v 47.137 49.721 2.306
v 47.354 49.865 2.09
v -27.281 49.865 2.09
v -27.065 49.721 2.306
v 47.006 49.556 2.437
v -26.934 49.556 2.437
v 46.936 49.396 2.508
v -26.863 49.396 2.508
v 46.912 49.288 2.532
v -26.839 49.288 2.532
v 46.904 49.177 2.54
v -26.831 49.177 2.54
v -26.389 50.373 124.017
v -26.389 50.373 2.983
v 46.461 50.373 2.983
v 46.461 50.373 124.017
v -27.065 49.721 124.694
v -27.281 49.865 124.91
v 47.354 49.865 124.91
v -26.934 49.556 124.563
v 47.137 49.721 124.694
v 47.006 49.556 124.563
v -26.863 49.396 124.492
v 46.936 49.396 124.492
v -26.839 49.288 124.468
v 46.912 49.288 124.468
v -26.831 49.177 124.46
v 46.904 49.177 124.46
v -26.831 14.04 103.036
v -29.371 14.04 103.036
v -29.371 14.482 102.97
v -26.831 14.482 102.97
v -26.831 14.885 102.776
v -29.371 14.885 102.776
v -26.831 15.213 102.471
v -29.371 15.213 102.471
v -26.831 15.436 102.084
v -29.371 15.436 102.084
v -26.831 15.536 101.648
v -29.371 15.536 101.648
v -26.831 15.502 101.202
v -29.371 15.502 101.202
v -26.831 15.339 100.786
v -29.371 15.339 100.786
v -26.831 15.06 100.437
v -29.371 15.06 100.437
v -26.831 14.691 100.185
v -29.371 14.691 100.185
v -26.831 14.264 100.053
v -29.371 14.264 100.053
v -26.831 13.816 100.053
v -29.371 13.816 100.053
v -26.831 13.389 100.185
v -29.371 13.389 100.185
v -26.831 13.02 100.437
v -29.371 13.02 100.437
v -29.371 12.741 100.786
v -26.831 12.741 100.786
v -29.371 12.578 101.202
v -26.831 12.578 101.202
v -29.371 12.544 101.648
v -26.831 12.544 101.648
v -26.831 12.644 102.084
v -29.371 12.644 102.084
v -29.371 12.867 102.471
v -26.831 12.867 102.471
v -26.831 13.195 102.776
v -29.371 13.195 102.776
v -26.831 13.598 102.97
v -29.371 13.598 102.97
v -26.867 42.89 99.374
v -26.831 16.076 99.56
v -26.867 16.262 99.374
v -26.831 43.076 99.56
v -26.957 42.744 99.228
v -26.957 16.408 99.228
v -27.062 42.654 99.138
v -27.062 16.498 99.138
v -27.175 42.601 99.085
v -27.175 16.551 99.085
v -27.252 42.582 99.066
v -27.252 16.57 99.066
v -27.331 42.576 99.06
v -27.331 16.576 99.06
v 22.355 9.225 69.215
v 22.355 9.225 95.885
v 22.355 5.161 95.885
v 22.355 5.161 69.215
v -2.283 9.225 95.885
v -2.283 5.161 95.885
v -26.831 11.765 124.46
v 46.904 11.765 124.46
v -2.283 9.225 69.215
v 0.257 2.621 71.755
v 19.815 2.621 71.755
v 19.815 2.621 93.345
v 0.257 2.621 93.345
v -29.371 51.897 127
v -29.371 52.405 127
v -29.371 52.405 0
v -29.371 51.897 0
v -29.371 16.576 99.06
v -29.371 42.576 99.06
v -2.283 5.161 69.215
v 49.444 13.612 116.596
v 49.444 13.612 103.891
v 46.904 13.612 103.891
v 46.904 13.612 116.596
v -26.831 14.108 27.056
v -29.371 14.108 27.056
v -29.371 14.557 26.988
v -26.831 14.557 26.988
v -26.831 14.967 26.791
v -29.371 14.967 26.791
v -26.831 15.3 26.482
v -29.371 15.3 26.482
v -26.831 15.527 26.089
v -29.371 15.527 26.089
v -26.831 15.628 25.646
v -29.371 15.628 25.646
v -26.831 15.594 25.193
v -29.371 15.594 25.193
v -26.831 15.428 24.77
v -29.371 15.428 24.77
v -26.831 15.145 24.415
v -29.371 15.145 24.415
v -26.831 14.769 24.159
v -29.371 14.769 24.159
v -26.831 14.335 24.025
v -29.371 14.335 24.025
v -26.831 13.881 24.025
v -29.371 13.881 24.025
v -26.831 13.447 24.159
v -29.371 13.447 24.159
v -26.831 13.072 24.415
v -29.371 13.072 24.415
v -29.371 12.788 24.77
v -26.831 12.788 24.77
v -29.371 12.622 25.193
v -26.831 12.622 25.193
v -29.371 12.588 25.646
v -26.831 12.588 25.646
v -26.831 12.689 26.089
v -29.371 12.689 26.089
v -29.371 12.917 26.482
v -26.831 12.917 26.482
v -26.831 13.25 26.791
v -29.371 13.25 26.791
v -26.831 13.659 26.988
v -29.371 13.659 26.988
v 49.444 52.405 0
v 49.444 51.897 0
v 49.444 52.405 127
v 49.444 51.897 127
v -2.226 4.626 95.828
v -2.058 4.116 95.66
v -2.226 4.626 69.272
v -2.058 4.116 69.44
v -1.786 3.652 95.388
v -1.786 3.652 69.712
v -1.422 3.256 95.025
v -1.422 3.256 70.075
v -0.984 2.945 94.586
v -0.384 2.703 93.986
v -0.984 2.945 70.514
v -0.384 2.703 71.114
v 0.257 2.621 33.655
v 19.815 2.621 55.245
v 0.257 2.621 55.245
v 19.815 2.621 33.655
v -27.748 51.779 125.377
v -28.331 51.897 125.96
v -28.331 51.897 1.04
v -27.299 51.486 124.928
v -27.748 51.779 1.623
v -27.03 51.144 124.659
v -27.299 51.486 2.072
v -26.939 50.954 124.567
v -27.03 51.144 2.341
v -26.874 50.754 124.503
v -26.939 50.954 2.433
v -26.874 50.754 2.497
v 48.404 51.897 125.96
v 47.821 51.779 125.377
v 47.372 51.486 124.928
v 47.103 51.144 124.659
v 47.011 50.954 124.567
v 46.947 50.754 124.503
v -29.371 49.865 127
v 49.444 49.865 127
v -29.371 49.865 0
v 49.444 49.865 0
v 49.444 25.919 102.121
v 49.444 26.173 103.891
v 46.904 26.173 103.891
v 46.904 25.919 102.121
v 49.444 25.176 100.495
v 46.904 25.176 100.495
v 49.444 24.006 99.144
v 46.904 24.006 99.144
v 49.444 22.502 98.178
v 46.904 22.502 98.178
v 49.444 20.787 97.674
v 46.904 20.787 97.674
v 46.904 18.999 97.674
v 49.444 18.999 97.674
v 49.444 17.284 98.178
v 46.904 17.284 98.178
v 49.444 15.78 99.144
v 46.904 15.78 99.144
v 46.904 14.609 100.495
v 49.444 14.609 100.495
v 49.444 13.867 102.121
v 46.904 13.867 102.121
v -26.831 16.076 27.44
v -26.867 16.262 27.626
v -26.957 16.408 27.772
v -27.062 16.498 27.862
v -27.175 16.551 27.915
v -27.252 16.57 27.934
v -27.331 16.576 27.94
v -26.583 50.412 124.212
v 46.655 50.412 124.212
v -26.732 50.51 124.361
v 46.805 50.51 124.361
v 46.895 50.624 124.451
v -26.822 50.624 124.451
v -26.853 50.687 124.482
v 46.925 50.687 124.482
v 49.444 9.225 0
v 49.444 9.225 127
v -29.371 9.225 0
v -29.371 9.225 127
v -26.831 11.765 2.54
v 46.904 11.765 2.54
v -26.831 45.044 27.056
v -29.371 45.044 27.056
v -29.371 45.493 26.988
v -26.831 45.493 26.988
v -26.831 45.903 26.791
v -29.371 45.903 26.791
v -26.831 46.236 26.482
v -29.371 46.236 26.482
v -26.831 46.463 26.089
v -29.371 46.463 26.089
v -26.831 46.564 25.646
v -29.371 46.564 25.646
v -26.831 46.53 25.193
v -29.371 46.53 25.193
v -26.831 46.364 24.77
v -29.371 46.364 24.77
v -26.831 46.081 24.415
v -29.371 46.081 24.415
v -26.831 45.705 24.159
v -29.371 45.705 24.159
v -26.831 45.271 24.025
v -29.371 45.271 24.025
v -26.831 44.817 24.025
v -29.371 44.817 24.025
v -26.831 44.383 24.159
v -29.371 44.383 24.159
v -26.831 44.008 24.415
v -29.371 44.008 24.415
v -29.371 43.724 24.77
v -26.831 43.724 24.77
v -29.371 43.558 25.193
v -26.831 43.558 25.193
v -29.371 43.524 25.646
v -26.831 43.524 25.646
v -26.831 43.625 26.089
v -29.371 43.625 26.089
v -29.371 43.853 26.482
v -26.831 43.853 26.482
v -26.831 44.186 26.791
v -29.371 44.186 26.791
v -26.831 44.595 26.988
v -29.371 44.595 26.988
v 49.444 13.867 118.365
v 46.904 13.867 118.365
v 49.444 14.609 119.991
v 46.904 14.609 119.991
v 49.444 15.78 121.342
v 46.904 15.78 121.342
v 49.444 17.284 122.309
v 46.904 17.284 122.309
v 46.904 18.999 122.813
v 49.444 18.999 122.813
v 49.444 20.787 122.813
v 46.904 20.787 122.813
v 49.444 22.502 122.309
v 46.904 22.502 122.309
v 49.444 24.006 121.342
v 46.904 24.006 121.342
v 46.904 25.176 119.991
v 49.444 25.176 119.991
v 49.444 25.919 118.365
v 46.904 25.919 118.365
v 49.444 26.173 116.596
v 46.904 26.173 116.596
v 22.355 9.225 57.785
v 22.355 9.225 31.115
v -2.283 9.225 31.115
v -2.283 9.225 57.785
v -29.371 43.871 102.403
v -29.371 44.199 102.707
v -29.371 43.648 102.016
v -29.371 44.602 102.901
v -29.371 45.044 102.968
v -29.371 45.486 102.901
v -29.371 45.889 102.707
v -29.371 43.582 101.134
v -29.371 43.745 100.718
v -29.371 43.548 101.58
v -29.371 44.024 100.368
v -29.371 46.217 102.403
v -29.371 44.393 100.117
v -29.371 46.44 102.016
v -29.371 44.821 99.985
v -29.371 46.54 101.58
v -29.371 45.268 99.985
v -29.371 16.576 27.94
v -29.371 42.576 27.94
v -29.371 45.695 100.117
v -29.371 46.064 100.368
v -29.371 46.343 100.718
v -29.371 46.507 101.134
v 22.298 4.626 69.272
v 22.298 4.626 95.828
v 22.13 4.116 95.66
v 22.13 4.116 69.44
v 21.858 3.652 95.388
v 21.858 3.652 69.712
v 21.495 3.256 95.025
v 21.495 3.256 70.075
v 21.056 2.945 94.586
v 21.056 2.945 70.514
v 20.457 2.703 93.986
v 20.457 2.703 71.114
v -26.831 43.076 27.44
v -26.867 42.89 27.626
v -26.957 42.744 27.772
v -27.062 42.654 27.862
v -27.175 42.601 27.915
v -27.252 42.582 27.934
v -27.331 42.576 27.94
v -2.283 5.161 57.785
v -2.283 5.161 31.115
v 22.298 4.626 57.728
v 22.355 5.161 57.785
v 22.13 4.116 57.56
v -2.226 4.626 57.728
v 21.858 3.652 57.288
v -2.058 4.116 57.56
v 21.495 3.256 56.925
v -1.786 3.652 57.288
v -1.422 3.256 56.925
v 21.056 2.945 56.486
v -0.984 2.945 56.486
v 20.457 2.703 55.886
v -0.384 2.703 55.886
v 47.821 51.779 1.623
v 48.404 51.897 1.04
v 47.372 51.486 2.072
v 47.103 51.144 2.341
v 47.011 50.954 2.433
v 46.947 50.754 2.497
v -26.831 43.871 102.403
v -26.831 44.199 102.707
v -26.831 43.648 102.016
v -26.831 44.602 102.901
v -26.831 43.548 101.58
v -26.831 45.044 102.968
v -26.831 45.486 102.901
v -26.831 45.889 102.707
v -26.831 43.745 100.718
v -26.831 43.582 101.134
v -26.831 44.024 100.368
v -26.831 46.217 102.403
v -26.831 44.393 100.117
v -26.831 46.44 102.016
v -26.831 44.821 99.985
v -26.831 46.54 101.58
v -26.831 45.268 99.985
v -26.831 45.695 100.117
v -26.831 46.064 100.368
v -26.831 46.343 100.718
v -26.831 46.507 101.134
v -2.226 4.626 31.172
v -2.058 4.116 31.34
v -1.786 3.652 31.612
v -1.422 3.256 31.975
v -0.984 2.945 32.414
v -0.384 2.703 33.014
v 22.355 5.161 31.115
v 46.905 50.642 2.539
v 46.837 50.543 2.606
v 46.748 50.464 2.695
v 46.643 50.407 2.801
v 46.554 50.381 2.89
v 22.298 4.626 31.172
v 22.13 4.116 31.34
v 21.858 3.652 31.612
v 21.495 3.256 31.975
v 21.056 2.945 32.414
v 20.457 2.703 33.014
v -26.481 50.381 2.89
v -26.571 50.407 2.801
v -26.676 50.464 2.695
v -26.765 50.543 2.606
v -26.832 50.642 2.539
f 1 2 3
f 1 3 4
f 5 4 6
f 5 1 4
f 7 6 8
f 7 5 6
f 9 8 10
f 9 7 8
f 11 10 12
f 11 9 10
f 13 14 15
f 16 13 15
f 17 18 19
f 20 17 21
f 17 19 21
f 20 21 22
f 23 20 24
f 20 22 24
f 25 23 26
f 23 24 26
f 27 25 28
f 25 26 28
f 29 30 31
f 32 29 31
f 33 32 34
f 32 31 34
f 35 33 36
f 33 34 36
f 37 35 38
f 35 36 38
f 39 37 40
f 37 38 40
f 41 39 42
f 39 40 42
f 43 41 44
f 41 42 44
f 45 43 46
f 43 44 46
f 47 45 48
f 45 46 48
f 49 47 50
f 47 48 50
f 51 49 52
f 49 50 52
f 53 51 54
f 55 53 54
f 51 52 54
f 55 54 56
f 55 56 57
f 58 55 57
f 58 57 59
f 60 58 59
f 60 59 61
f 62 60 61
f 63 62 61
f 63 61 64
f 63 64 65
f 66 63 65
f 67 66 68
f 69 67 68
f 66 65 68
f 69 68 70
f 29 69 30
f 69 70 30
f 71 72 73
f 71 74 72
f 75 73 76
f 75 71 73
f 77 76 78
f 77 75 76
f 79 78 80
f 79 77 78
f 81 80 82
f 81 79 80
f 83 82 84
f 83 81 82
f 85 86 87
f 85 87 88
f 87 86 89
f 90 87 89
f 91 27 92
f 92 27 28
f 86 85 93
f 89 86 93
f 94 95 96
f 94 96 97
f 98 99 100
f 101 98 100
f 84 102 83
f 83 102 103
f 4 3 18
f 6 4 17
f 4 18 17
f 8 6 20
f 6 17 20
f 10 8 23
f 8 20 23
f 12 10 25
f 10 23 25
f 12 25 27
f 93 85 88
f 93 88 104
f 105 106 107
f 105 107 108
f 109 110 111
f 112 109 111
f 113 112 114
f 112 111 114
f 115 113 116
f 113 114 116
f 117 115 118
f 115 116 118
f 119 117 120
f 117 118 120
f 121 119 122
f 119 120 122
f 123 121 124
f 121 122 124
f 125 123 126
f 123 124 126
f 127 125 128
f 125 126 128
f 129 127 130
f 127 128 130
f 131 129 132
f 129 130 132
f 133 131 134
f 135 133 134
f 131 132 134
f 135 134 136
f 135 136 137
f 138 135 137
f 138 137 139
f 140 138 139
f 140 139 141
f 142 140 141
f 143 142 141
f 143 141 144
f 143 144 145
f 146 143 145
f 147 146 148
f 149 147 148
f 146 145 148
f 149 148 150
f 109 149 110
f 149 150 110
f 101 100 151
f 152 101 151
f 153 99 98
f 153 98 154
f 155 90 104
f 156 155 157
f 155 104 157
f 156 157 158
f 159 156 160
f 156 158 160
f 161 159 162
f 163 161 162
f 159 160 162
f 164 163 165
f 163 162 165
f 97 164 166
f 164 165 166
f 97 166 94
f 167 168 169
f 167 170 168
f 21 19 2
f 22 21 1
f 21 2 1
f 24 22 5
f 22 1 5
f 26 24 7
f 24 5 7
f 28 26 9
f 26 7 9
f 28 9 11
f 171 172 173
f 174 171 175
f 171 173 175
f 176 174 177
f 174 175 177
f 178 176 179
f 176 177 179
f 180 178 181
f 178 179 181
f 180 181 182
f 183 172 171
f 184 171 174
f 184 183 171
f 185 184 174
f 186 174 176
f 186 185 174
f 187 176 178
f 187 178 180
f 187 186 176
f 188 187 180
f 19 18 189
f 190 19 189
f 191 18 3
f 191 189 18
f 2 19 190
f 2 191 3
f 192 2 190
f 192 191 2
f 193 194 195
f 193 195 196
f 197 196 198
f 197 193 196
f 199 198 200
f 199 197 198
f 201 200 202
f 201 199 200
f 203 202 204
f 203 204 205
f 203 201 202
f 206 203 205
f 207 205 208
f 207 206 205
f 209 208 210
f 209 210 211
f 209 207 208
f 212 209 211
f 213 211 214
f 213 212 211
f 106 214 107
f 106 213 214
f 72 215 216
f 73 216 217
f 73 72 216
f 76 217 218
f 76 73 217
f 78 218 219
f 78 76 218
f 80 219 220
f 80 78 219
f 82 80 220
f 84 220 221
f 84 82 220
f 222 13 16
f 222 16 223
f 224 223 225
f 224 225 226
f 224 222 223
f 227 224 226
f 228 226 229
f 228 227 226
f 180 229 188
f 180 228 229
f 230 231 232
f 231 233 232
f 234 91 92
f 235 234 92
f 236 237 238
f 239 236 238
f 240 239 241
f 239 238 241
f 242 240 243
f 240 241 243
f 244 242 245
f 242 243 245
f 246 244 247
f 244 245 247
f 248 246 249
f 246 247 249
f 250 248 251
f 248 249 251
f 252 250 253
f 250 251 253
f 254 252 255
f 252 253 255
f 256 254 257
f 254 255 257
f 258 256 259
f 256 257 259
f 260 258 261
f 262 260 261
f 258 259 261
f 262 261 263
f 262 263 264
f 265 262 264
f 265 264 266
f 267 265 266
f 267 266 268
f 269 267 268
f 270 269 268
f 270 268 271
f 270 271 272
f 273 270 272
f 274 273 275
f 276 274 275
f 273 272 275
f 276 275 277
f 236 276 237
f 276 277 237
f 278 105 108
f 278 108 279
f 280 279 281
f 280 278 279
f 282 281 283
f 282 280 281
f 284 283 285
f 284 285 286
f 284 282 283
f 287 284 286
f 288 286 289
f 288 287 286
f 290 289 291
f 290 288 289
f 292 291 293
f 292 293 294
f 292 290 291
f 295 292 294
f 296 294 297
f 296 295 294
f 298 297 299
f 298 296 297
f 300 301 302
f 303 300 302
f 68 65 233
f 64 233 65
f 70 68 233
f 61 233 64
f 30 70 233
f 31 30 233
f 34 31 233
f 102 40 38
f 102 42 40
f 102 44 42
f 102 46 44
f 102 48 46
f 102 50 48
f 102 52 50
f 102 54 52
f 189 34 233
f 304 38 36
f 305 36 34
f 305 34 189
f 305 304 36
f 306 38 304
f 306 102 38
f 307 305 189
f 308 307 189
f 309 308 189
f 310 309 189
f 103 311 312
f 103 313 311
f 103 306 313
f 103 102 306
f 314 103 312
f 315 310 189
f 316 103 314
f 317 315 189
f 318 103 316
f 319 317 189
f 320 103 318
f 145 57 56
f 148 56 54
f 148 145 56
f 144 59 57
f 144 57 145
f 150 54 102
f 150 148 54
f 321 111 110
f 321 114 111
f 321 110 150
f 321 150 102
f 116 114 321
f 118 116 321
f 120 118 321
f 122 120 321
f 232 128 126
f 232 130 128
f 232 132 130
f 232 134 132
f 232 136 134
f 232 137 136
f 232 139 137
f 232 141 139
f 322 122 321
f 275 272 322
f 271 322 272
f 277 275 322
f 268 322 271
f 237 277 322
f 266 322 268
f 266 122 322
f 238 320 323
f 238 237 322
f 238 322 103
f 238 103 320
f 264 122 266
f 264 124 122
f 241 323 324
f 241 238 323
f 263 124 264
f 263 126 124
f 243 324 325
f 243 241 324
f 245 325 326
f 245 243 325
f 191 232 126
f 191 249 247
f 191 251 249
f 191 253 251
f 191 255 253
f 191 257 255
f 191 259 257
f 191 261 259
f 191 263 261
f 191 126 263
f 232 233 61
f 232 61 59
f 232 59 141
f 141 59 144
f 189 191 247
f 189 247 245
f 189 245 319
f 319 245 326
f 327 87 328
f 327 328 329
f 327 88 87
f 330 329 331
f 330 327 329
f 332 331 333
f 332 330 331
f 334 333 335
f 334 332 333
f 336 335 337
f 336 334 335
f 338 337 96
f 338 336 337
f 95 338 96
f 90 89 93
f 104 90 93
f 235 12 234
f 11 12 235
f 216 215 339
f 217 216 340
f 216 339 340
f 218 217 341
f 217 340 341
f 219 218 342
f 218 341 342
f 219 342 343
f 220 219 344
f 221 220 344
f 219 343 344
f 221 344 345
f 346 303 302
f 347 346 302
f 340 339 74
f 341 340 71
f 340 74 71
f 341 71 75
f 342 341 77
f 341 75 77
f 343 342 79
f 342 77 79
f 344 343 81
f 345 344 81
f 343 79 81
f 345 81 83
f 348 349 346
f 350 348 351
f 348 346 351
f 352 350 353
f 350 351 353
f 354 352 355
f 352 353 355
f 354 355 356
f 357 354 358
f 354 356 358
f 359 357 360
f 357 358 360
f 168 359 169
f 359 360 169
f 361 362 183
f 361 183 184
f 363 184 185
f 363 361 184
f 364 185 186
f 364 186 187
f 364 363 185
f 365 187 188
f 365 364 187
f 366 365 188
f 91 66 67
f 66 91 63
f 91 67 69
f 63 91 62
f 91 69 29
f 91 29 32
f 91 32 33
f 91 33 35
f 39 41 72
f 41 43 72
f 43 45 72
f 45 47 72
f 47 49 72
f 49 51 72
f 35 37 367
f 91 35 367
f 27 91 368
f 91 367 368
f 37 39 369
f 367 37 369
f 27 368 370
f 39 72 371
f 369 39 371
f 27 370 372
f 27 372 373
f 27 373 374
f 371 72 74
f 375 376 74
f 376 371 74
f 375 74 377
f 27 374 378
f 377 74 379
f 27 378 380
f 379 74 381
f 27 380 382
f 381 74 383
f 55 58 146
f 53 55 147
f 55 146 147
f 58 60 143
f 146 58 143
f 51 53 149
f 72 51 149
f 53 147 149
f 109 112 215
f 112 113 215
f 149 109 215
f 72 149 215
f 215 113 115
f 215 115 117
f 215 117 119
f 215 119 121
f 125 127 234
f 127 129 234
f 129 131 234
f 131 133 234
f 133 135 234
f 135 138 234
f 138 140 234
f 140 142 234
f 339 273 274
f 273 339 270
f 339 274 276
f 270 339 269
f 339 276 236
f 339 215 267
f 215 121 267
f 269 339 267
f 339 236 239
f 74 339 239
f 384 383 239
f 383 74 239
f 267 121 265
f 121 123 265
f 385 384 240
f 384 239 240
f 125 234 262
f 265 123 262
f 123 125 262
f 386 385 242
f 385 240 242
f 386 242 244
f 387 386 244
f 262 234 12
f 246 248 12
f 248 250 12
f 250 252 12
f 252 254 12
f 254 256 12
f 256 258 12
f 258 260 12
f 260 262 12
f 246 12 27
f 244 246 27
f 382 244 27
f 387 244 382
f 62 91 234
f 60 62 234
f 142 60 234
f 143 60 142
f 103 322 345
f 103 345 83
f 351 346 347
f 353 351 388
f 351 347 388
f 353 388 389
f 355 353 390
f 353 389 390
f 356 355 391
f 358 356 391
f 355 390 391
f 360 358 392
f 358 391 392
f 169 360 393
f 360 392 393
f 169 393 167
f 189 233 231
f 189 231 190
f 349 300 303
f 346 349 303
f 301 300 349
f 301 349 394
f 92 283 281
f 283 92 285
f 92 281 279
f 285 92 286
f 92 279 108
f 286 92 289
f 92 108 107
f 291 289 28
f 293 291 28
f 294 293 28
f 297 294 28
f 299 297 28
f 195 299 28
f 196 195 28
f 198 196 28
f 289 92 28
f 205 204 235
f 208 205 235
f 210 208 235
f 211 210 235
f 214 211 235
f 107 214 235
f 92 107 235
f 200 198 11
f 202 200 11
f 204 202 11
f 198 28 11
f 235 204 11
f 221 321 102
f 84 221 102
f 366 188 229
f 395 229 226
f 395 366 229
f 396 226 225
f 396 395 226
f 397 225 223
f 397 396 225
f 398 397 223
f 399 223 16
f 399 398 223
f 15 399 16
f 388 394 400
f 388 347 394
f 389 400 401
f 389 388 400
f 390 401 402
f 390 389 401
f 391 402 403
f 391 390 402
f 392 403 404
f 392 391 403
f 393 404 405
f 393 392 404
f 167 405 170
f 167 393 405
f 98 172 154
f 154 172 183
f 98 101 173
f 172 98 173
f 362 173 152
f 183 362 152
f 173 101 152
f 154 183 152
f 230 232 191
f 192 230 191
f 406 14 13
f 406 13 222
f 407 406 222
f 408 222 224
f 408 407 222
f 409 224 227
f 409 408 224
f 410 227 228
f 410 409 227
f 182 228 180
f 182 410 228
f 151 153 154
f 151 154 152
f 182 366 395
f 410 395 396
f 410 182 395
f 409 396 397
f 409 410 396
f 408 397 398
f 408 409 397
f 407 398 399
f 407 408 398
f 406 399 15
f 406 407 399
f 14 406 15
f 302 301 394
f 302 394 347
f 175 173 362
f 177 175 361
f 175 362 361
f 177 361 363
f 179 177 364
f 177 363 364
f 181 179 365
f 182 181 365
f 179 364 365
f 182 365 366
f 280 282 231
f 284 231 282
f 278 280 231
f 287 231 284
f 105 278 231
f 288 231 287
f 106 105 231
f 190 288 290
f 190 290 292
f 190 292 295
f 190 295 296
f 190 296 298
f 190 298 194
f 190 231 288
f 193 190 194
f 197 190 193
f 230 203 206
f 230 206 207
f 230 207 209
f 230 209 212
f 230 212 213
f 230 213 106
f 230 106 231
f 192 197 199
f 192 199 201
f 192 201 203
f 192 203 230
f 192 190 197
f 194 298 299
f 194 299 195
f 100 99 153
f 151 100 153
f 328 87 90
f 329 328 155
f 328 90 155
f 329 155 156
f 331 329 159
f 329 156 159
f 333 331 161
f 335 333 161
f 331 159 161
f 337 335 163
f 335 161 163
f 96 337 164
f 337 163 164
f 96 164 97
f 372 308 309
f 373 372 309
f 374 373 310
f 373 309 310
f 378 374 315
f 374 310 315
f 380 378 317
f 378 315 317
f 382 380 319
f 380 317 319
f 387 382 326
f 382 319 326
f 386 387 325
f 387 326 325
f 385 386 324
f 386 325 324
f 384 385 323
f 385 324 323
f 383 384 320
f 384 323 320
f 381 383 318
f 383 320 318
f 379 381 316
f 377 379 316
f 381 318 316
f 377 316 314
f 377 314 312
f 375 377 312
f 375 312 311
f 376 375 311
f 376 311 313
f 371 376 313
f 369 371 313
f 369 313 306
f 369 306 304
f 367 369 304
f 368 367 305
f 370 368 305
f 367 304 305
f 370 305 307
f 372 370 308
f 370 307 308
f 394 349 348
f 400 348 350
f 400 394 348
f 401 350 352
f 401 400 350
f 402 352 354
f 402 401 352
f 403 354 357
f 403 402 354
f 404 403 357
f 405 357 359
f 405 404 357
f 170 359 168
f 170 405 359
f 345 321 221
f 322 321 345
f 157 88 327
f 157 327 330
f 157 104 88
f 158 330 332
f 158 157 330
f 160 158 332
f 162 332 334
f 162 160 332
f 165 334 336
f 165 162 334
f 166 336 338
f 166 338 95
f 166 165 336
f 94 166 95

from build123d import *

# Parameters (mm, degrees)
SKETCH3_W             = 76.274754771
SKETCH3_H             = 40.702671828
BOSS_EXTRUDE2_DEPTH   = 127
SHELL1_T              = -2.54
SKETCH5_W             = 127
SKETCH5_H             = 40.702671828
BOSS_EXTRUDE6_DEPTH   = 2.54
SKETCH12_W            = 24.638
SKETCH12_H            = 26.67
BOSS_EXTRUDE8_DEPTH   = 6.604
BOSS_EXTRUDE8_2_DEPTH = 6.604
SKETCH15_R            = 1.5
SKETCH15_R_2          = 1.524
CUT_EXTRUDE7_DEPTH    = 2.54
FILLET4_R             = 2.54
FILLET5_R             = 2.54
FILLET7_R             = 0.75
CUT_EXTRUDE8_DEPTH    = 2.54
SKETCH26_W            = 78.814754771
SKETCH26_H            = 127
BOSS_EXTRUDE9_DEPTH   = 2.54
CUT_EXTRUDE12_START   = -2.54
SKETCH26_7_W          = 78.814754771
SKETCH26_7_H          = 127
CUT_EXTRUDE12_DEPTH   = 2.032
SKETCH31_W            = 73.734754771
SKETCH31_H            = 121.92
BOSS_EXTRUDE10_DEPTH  = 2.032
FILLET12_R            = 1.5
FILLET13_START        = -26.874187053
FILLET13_DEPTH        = 73.820959308
FILLET13_START_2      = 1.0399999
FILLET13_2_DEPTH      = 124.9200002
SKETCH11_W            = 71.12
SKETCH11_H            = 26
CUT_EXTRUDE13_DEPTH   = 2.54
FILLET14_R            = 0.5


with BuildPart() as part:
    # Sketch3 → Boss-Extrude2 (new body)
    with BuildSketch(Plane.XY):
        with Locations((8.766292601, 29.576142827)):
            Rectangle(SKETCH3_W, SKETCH3_H)
    extrude(amount=BOSS_EXTRUDE2_DEPTH)

    # Shell1
    shell1_openings = [part.faces().sort_by_distance(p)[0] for p in [
        (8.766292601, 49.927478741, 63.5),
        (46.903669986, 29.576142827, 63.5),
    ]]
    offset(amount=SHELL1_T, openings=shell1_openings, kind=Kind.INTERSECTION)

    # Sketch5 → Boss-Extrude6 (add)
    with BuildSketch(Plane(origin=(46.903669986, 0, 0), x_dir=(0, 0, -1), z_dir=(1, 0, 0))):
        with Locations((-63.5, 29.576142827)):
            Rectangle(SKETCH5_W, SKETCH5_H)
    extrude(amount=BOSS_EXTRUDE6_DEPTH)

    # Sketch15 → Cut-Extrude7 (cut)
    with BuildSketch(Plane.ZY.offset(29.371084785)):
        with Locations((101.468, 45.044142827)):
            Circle(SKETCH15_R)
        with Locations((101.536185385, 14.039957442)):
            Circle(SKETCH15_R)
        with Locations((25.532, 45.044142827)):
            Circle(SKETCH15_R_2)
        with Locations((25.532, 14.108142827)):
            Circle(SKETCH15_R_2)
    extrude(amount=-CUT_EXTRUDE7_DEPTH, mode=Mode.SUBTRACT)

    # Fillet7
    fillet7_edges = [part.edges().sort_by_distance(p)[0] for p in [
        (-26.831084785, 49.927478741, 63.5),
        (10.036292601, 49.927478741, 2.54),
        (10.036292601, 49.927478741, 124.46),
        (46.903669986, 49.927478741, 63.5),
    ]]
    fillet(fillet7_edges, radius=FILLET7_R)

    # Sketch6 → Cut-Extrude8 (cut)
    with BuildSketch(Plane(origin=(49.443669986, 0.547229788, -2.723397162), x_dir=(0, 0, -1), z_dir=(1, 0, 0))):
        with BuildLine():
            Line((-119.319419188, 25.626017745), (-106.614290816, 25.626017745))
            ThreePointArc((-106.614290816, 25.626017745), (-100.333849188, 19.345576117), (-106.614290816, 13.065134489))
            Line((-106.614290816, 13.065134489), (-119.319419188, 13.065134489))
            ThreePointArc((-119.319419188, 13.065134489), (-125.599860816, 19.345576117), (-119.319419188, 25.626017745))
        make_face()
    extrude(amount=-CUT_EXTRUDE8_DEPTH, mode=Mode.SUBTRACT)


with BuildPart() as body_2:
    # Sketch12 → Boss-Extrude8 (new body)
    with BuildSketch(Plane(origin=(0, 9.224806913, 0), x_dir=(-1, 0, 0), z_dir=(0, -1, 0))):
        with Locations((-10.036292601, -44.45)):
            Rectangle(SKETCH12_W, SKETCH12_H)
    extrude(amount=BOSS_EXTRUDE8_DEPTH)

    # Fillet4
    fillet4_edges = [body_2.edges().sort_by_distance(p)[0] for p in [
        (10.036292601, 2.620806913, 57.785),
        (-2.282707399, 2.620806913, 44.45),
        (10.036292601, 2.620806913, 31.115),
        (22.355292601, 2.620806913, 44.45),
    ]]
    fillet(fillet4_edges, radius=FILLET4_R)


with BuildPart() as body_3:
    # Sketch12 → Boss-Extrude8 2 (new body)
    with BuildSketch(Plane(origin=(0, 9.224806913, 0), x_dir=(-1, 0, 0), z_dir=(0, -1, 0))):
        with Locations((-10.036292601, -82.55)):
            Rectangle(SKETCH12_W, SKETCH12_H)
    extrude(amount=BOSS_EXTRUDE8_2_DEPTH)

    # Fillet5
    fillet5_edges = [body_3.edges().sort_by_distance(p)[0] for p in [
        (10.036292601, 2.620806913, 69.215),
        (22.355292601, 2.620806913, 82.55),
        (10.036292601, 2.620806913, 95.885),
        (-2.282707399, 2.620806913, 82.55),
    ]]
    fillet(fillet5_edges, radius=FILLET5_R)


with BuildPart() as body_4:
    # Sketch26 → Boss-Extrude9 (new body)
    with BuildSketch(Plane(origin=(0, 52.404806913, 0), x_dir=(1, 0, 0), z_dir=(0, 1, 0))):
        with Locations((10.036292601, -63.5)):
            Rectangle(SKETCH26_W, SKETCH26_H)
    extrude(amount=-BOSS_EXTRUDE9_DEPTH)


with BuildPart() as cut_extrude12_tool:
    # Sketch26<7> → Cut-Extrude12 (new body)
    with BuildSketch(Plane(origin=(0, 52.404806913, 0), x_dir=(1, 0, 0), z_dir=(0, 1, 0)).offset(CUT_EXTRUDE12_START)):
        with Locations((10.036292601, -63.5)):
            Rectangle(SKETCH26_7_W, SKETCH26_7_H)
    extrude(amount=CUT_EXTRUDE12_DEPTH)


with BuildPart() as part_1:
    add(part.part)

    # Cut-Extrude12: cut by cut_extrude12_tool
    add(cut_extrude12_tool.part, mode=Mode.SUBTRACT)

    # Sketch11 → Cut-Extrude13 (cut)
    with BuildSketch(Plane.ZY.offset(29.371084785)):
        with Locations((63.5, 29.576142827)):
            Rectangle(SKETCH11_W, SKETCH11_H)
    extrude(amount=-CUT_EXTRUDE13_DEPTH, mode=Mode.SUBTRACT)

    # Fillet14
    fillet14_edges = [part_1.edges().sort_by_distance(p)[0] for p in [
        (-26.831084785, 29.576142827, 27.94),
        (-26.831084785, 42.576142827, 63.5),
        (-26.831084785, 29.576142827, 99.06),
        (-26.831084785, 16.576142827, 63.5),
    ]]
    fillet(fillet14_edges, radius=FILLET14_R)


with BuildPart() as body_4_1:
    add(body_4.part)

    # Cut-Extrude12: cut by cut_extrude12_tool
    add(cut_extrude12_tool.part, mode=Mode.SUBTRACT)

    # Sketch31 → Boss-Extrude10 (add)
    with BuildSketch(Plane(origin=(0, 52.404806913, 0), x_dir=(1, 0, 0), z_dir=(0, 1, 0))):
        with Locations((10.036292601, -63.5)):
            Rectangle(SKETCH31_W, SKETCH31_H)
    extrude(amount=-BOSS_EXTRUDE10_DEPTH)

    # Fillet12
    fillet12_edges = [body_4_1.edges().sort_by_distance(p)[0] for p in [
        (10.036292601, 51.896806913, 124.46),
        (46.903669986, 51.896806913, 63.5),
        (10.036292601, 51.896806913, 2.54),
        (-26.831084785, 51.896806913, 63.5),
    ]]
    fillet(fillet12_edges, radius=FILLET12_R)

    # Fillet13: read off the stored shape, not the designer's step
    # Fillet13 outline → Fillet13 (cut)
    with BuildSketch(Plane.YZ.offset(FILLET13_START)):
        with BuildLine():
            ThreePointArc((50.753806913, 2.496897731), (50.479424147, 2.673904321), (50.372806913, 2.982530309))
            Line((50.372806913, 2.982530309), (50.372806913, 2.54))
            Line((50.372806913, 2.54), (50.396806913, 2.54))
            ThreePointArc((50.396806913, 2.54), (50.57660319, 2.529185448), (50.753806913, 2.496897731))
        make_face()
        with BuildLine():
            ThreePointArc((50.372806913, 124.017469691), (50.479424147, 124.326095679), (50.753806913, 124.503102269))
            ThreePointArc((50.753806913, 124.503102269), (50.57660319, 124.470814552), (50.396806913, 124.46))
            Line((50.396806913, 124.46), (50.372806913, 124.46))
            Line((50.372806913, 124.46), (50.372806913, 124.017469691))
        make_face()
    extrude(amount=FILLET13_DEPTH, mode=Mode.SUBTRACT)

    # Fillet13 2 outline → Fillet13 2 (cut)
    with BuildSketch(Plane.XY.offset(FILLET13_START_2)):
        with BuildLine():
            ThreePointArc((46.946772255, 50.753806913), (46.769765665, 50.479424147), (46.461139678, 50.372806913))
            Line((46.461139678, 50.372806913), (46.903669986, 50.372806913))
            Line((46.903669986, 50.372806913), (46.903669986, 50.396806913))
            ThreePointArc((46.903669986, 50.396806913), (46.914484538, 50.57660319), (46.946772255, 50.753806913))
        make_face()
        with BuildLine():
            ThreePointArc((-26.388554476, 50.372806913), (-26.697180463, 50.479424147), (-26.874187053, 50.753806913))
            ThreePointArc((-26.874187053, 50.753806913), (-26.841899337, 50.57660319), (-26.831084785, 50.396806913))
            Line((-26.831084785, 50.396806913), (-26.831084785, 50.372806913))
            Line((-26.831084785, 50.372806913), (-26.388554476, 50.372806913))
        make_face()
    extrude(amount=FILLET13_2_DEPTH, mode=Mode.SUBTRACT)


solid = Compound([body_2.part, body_3.part, part_1.part, body_4_1.part])
